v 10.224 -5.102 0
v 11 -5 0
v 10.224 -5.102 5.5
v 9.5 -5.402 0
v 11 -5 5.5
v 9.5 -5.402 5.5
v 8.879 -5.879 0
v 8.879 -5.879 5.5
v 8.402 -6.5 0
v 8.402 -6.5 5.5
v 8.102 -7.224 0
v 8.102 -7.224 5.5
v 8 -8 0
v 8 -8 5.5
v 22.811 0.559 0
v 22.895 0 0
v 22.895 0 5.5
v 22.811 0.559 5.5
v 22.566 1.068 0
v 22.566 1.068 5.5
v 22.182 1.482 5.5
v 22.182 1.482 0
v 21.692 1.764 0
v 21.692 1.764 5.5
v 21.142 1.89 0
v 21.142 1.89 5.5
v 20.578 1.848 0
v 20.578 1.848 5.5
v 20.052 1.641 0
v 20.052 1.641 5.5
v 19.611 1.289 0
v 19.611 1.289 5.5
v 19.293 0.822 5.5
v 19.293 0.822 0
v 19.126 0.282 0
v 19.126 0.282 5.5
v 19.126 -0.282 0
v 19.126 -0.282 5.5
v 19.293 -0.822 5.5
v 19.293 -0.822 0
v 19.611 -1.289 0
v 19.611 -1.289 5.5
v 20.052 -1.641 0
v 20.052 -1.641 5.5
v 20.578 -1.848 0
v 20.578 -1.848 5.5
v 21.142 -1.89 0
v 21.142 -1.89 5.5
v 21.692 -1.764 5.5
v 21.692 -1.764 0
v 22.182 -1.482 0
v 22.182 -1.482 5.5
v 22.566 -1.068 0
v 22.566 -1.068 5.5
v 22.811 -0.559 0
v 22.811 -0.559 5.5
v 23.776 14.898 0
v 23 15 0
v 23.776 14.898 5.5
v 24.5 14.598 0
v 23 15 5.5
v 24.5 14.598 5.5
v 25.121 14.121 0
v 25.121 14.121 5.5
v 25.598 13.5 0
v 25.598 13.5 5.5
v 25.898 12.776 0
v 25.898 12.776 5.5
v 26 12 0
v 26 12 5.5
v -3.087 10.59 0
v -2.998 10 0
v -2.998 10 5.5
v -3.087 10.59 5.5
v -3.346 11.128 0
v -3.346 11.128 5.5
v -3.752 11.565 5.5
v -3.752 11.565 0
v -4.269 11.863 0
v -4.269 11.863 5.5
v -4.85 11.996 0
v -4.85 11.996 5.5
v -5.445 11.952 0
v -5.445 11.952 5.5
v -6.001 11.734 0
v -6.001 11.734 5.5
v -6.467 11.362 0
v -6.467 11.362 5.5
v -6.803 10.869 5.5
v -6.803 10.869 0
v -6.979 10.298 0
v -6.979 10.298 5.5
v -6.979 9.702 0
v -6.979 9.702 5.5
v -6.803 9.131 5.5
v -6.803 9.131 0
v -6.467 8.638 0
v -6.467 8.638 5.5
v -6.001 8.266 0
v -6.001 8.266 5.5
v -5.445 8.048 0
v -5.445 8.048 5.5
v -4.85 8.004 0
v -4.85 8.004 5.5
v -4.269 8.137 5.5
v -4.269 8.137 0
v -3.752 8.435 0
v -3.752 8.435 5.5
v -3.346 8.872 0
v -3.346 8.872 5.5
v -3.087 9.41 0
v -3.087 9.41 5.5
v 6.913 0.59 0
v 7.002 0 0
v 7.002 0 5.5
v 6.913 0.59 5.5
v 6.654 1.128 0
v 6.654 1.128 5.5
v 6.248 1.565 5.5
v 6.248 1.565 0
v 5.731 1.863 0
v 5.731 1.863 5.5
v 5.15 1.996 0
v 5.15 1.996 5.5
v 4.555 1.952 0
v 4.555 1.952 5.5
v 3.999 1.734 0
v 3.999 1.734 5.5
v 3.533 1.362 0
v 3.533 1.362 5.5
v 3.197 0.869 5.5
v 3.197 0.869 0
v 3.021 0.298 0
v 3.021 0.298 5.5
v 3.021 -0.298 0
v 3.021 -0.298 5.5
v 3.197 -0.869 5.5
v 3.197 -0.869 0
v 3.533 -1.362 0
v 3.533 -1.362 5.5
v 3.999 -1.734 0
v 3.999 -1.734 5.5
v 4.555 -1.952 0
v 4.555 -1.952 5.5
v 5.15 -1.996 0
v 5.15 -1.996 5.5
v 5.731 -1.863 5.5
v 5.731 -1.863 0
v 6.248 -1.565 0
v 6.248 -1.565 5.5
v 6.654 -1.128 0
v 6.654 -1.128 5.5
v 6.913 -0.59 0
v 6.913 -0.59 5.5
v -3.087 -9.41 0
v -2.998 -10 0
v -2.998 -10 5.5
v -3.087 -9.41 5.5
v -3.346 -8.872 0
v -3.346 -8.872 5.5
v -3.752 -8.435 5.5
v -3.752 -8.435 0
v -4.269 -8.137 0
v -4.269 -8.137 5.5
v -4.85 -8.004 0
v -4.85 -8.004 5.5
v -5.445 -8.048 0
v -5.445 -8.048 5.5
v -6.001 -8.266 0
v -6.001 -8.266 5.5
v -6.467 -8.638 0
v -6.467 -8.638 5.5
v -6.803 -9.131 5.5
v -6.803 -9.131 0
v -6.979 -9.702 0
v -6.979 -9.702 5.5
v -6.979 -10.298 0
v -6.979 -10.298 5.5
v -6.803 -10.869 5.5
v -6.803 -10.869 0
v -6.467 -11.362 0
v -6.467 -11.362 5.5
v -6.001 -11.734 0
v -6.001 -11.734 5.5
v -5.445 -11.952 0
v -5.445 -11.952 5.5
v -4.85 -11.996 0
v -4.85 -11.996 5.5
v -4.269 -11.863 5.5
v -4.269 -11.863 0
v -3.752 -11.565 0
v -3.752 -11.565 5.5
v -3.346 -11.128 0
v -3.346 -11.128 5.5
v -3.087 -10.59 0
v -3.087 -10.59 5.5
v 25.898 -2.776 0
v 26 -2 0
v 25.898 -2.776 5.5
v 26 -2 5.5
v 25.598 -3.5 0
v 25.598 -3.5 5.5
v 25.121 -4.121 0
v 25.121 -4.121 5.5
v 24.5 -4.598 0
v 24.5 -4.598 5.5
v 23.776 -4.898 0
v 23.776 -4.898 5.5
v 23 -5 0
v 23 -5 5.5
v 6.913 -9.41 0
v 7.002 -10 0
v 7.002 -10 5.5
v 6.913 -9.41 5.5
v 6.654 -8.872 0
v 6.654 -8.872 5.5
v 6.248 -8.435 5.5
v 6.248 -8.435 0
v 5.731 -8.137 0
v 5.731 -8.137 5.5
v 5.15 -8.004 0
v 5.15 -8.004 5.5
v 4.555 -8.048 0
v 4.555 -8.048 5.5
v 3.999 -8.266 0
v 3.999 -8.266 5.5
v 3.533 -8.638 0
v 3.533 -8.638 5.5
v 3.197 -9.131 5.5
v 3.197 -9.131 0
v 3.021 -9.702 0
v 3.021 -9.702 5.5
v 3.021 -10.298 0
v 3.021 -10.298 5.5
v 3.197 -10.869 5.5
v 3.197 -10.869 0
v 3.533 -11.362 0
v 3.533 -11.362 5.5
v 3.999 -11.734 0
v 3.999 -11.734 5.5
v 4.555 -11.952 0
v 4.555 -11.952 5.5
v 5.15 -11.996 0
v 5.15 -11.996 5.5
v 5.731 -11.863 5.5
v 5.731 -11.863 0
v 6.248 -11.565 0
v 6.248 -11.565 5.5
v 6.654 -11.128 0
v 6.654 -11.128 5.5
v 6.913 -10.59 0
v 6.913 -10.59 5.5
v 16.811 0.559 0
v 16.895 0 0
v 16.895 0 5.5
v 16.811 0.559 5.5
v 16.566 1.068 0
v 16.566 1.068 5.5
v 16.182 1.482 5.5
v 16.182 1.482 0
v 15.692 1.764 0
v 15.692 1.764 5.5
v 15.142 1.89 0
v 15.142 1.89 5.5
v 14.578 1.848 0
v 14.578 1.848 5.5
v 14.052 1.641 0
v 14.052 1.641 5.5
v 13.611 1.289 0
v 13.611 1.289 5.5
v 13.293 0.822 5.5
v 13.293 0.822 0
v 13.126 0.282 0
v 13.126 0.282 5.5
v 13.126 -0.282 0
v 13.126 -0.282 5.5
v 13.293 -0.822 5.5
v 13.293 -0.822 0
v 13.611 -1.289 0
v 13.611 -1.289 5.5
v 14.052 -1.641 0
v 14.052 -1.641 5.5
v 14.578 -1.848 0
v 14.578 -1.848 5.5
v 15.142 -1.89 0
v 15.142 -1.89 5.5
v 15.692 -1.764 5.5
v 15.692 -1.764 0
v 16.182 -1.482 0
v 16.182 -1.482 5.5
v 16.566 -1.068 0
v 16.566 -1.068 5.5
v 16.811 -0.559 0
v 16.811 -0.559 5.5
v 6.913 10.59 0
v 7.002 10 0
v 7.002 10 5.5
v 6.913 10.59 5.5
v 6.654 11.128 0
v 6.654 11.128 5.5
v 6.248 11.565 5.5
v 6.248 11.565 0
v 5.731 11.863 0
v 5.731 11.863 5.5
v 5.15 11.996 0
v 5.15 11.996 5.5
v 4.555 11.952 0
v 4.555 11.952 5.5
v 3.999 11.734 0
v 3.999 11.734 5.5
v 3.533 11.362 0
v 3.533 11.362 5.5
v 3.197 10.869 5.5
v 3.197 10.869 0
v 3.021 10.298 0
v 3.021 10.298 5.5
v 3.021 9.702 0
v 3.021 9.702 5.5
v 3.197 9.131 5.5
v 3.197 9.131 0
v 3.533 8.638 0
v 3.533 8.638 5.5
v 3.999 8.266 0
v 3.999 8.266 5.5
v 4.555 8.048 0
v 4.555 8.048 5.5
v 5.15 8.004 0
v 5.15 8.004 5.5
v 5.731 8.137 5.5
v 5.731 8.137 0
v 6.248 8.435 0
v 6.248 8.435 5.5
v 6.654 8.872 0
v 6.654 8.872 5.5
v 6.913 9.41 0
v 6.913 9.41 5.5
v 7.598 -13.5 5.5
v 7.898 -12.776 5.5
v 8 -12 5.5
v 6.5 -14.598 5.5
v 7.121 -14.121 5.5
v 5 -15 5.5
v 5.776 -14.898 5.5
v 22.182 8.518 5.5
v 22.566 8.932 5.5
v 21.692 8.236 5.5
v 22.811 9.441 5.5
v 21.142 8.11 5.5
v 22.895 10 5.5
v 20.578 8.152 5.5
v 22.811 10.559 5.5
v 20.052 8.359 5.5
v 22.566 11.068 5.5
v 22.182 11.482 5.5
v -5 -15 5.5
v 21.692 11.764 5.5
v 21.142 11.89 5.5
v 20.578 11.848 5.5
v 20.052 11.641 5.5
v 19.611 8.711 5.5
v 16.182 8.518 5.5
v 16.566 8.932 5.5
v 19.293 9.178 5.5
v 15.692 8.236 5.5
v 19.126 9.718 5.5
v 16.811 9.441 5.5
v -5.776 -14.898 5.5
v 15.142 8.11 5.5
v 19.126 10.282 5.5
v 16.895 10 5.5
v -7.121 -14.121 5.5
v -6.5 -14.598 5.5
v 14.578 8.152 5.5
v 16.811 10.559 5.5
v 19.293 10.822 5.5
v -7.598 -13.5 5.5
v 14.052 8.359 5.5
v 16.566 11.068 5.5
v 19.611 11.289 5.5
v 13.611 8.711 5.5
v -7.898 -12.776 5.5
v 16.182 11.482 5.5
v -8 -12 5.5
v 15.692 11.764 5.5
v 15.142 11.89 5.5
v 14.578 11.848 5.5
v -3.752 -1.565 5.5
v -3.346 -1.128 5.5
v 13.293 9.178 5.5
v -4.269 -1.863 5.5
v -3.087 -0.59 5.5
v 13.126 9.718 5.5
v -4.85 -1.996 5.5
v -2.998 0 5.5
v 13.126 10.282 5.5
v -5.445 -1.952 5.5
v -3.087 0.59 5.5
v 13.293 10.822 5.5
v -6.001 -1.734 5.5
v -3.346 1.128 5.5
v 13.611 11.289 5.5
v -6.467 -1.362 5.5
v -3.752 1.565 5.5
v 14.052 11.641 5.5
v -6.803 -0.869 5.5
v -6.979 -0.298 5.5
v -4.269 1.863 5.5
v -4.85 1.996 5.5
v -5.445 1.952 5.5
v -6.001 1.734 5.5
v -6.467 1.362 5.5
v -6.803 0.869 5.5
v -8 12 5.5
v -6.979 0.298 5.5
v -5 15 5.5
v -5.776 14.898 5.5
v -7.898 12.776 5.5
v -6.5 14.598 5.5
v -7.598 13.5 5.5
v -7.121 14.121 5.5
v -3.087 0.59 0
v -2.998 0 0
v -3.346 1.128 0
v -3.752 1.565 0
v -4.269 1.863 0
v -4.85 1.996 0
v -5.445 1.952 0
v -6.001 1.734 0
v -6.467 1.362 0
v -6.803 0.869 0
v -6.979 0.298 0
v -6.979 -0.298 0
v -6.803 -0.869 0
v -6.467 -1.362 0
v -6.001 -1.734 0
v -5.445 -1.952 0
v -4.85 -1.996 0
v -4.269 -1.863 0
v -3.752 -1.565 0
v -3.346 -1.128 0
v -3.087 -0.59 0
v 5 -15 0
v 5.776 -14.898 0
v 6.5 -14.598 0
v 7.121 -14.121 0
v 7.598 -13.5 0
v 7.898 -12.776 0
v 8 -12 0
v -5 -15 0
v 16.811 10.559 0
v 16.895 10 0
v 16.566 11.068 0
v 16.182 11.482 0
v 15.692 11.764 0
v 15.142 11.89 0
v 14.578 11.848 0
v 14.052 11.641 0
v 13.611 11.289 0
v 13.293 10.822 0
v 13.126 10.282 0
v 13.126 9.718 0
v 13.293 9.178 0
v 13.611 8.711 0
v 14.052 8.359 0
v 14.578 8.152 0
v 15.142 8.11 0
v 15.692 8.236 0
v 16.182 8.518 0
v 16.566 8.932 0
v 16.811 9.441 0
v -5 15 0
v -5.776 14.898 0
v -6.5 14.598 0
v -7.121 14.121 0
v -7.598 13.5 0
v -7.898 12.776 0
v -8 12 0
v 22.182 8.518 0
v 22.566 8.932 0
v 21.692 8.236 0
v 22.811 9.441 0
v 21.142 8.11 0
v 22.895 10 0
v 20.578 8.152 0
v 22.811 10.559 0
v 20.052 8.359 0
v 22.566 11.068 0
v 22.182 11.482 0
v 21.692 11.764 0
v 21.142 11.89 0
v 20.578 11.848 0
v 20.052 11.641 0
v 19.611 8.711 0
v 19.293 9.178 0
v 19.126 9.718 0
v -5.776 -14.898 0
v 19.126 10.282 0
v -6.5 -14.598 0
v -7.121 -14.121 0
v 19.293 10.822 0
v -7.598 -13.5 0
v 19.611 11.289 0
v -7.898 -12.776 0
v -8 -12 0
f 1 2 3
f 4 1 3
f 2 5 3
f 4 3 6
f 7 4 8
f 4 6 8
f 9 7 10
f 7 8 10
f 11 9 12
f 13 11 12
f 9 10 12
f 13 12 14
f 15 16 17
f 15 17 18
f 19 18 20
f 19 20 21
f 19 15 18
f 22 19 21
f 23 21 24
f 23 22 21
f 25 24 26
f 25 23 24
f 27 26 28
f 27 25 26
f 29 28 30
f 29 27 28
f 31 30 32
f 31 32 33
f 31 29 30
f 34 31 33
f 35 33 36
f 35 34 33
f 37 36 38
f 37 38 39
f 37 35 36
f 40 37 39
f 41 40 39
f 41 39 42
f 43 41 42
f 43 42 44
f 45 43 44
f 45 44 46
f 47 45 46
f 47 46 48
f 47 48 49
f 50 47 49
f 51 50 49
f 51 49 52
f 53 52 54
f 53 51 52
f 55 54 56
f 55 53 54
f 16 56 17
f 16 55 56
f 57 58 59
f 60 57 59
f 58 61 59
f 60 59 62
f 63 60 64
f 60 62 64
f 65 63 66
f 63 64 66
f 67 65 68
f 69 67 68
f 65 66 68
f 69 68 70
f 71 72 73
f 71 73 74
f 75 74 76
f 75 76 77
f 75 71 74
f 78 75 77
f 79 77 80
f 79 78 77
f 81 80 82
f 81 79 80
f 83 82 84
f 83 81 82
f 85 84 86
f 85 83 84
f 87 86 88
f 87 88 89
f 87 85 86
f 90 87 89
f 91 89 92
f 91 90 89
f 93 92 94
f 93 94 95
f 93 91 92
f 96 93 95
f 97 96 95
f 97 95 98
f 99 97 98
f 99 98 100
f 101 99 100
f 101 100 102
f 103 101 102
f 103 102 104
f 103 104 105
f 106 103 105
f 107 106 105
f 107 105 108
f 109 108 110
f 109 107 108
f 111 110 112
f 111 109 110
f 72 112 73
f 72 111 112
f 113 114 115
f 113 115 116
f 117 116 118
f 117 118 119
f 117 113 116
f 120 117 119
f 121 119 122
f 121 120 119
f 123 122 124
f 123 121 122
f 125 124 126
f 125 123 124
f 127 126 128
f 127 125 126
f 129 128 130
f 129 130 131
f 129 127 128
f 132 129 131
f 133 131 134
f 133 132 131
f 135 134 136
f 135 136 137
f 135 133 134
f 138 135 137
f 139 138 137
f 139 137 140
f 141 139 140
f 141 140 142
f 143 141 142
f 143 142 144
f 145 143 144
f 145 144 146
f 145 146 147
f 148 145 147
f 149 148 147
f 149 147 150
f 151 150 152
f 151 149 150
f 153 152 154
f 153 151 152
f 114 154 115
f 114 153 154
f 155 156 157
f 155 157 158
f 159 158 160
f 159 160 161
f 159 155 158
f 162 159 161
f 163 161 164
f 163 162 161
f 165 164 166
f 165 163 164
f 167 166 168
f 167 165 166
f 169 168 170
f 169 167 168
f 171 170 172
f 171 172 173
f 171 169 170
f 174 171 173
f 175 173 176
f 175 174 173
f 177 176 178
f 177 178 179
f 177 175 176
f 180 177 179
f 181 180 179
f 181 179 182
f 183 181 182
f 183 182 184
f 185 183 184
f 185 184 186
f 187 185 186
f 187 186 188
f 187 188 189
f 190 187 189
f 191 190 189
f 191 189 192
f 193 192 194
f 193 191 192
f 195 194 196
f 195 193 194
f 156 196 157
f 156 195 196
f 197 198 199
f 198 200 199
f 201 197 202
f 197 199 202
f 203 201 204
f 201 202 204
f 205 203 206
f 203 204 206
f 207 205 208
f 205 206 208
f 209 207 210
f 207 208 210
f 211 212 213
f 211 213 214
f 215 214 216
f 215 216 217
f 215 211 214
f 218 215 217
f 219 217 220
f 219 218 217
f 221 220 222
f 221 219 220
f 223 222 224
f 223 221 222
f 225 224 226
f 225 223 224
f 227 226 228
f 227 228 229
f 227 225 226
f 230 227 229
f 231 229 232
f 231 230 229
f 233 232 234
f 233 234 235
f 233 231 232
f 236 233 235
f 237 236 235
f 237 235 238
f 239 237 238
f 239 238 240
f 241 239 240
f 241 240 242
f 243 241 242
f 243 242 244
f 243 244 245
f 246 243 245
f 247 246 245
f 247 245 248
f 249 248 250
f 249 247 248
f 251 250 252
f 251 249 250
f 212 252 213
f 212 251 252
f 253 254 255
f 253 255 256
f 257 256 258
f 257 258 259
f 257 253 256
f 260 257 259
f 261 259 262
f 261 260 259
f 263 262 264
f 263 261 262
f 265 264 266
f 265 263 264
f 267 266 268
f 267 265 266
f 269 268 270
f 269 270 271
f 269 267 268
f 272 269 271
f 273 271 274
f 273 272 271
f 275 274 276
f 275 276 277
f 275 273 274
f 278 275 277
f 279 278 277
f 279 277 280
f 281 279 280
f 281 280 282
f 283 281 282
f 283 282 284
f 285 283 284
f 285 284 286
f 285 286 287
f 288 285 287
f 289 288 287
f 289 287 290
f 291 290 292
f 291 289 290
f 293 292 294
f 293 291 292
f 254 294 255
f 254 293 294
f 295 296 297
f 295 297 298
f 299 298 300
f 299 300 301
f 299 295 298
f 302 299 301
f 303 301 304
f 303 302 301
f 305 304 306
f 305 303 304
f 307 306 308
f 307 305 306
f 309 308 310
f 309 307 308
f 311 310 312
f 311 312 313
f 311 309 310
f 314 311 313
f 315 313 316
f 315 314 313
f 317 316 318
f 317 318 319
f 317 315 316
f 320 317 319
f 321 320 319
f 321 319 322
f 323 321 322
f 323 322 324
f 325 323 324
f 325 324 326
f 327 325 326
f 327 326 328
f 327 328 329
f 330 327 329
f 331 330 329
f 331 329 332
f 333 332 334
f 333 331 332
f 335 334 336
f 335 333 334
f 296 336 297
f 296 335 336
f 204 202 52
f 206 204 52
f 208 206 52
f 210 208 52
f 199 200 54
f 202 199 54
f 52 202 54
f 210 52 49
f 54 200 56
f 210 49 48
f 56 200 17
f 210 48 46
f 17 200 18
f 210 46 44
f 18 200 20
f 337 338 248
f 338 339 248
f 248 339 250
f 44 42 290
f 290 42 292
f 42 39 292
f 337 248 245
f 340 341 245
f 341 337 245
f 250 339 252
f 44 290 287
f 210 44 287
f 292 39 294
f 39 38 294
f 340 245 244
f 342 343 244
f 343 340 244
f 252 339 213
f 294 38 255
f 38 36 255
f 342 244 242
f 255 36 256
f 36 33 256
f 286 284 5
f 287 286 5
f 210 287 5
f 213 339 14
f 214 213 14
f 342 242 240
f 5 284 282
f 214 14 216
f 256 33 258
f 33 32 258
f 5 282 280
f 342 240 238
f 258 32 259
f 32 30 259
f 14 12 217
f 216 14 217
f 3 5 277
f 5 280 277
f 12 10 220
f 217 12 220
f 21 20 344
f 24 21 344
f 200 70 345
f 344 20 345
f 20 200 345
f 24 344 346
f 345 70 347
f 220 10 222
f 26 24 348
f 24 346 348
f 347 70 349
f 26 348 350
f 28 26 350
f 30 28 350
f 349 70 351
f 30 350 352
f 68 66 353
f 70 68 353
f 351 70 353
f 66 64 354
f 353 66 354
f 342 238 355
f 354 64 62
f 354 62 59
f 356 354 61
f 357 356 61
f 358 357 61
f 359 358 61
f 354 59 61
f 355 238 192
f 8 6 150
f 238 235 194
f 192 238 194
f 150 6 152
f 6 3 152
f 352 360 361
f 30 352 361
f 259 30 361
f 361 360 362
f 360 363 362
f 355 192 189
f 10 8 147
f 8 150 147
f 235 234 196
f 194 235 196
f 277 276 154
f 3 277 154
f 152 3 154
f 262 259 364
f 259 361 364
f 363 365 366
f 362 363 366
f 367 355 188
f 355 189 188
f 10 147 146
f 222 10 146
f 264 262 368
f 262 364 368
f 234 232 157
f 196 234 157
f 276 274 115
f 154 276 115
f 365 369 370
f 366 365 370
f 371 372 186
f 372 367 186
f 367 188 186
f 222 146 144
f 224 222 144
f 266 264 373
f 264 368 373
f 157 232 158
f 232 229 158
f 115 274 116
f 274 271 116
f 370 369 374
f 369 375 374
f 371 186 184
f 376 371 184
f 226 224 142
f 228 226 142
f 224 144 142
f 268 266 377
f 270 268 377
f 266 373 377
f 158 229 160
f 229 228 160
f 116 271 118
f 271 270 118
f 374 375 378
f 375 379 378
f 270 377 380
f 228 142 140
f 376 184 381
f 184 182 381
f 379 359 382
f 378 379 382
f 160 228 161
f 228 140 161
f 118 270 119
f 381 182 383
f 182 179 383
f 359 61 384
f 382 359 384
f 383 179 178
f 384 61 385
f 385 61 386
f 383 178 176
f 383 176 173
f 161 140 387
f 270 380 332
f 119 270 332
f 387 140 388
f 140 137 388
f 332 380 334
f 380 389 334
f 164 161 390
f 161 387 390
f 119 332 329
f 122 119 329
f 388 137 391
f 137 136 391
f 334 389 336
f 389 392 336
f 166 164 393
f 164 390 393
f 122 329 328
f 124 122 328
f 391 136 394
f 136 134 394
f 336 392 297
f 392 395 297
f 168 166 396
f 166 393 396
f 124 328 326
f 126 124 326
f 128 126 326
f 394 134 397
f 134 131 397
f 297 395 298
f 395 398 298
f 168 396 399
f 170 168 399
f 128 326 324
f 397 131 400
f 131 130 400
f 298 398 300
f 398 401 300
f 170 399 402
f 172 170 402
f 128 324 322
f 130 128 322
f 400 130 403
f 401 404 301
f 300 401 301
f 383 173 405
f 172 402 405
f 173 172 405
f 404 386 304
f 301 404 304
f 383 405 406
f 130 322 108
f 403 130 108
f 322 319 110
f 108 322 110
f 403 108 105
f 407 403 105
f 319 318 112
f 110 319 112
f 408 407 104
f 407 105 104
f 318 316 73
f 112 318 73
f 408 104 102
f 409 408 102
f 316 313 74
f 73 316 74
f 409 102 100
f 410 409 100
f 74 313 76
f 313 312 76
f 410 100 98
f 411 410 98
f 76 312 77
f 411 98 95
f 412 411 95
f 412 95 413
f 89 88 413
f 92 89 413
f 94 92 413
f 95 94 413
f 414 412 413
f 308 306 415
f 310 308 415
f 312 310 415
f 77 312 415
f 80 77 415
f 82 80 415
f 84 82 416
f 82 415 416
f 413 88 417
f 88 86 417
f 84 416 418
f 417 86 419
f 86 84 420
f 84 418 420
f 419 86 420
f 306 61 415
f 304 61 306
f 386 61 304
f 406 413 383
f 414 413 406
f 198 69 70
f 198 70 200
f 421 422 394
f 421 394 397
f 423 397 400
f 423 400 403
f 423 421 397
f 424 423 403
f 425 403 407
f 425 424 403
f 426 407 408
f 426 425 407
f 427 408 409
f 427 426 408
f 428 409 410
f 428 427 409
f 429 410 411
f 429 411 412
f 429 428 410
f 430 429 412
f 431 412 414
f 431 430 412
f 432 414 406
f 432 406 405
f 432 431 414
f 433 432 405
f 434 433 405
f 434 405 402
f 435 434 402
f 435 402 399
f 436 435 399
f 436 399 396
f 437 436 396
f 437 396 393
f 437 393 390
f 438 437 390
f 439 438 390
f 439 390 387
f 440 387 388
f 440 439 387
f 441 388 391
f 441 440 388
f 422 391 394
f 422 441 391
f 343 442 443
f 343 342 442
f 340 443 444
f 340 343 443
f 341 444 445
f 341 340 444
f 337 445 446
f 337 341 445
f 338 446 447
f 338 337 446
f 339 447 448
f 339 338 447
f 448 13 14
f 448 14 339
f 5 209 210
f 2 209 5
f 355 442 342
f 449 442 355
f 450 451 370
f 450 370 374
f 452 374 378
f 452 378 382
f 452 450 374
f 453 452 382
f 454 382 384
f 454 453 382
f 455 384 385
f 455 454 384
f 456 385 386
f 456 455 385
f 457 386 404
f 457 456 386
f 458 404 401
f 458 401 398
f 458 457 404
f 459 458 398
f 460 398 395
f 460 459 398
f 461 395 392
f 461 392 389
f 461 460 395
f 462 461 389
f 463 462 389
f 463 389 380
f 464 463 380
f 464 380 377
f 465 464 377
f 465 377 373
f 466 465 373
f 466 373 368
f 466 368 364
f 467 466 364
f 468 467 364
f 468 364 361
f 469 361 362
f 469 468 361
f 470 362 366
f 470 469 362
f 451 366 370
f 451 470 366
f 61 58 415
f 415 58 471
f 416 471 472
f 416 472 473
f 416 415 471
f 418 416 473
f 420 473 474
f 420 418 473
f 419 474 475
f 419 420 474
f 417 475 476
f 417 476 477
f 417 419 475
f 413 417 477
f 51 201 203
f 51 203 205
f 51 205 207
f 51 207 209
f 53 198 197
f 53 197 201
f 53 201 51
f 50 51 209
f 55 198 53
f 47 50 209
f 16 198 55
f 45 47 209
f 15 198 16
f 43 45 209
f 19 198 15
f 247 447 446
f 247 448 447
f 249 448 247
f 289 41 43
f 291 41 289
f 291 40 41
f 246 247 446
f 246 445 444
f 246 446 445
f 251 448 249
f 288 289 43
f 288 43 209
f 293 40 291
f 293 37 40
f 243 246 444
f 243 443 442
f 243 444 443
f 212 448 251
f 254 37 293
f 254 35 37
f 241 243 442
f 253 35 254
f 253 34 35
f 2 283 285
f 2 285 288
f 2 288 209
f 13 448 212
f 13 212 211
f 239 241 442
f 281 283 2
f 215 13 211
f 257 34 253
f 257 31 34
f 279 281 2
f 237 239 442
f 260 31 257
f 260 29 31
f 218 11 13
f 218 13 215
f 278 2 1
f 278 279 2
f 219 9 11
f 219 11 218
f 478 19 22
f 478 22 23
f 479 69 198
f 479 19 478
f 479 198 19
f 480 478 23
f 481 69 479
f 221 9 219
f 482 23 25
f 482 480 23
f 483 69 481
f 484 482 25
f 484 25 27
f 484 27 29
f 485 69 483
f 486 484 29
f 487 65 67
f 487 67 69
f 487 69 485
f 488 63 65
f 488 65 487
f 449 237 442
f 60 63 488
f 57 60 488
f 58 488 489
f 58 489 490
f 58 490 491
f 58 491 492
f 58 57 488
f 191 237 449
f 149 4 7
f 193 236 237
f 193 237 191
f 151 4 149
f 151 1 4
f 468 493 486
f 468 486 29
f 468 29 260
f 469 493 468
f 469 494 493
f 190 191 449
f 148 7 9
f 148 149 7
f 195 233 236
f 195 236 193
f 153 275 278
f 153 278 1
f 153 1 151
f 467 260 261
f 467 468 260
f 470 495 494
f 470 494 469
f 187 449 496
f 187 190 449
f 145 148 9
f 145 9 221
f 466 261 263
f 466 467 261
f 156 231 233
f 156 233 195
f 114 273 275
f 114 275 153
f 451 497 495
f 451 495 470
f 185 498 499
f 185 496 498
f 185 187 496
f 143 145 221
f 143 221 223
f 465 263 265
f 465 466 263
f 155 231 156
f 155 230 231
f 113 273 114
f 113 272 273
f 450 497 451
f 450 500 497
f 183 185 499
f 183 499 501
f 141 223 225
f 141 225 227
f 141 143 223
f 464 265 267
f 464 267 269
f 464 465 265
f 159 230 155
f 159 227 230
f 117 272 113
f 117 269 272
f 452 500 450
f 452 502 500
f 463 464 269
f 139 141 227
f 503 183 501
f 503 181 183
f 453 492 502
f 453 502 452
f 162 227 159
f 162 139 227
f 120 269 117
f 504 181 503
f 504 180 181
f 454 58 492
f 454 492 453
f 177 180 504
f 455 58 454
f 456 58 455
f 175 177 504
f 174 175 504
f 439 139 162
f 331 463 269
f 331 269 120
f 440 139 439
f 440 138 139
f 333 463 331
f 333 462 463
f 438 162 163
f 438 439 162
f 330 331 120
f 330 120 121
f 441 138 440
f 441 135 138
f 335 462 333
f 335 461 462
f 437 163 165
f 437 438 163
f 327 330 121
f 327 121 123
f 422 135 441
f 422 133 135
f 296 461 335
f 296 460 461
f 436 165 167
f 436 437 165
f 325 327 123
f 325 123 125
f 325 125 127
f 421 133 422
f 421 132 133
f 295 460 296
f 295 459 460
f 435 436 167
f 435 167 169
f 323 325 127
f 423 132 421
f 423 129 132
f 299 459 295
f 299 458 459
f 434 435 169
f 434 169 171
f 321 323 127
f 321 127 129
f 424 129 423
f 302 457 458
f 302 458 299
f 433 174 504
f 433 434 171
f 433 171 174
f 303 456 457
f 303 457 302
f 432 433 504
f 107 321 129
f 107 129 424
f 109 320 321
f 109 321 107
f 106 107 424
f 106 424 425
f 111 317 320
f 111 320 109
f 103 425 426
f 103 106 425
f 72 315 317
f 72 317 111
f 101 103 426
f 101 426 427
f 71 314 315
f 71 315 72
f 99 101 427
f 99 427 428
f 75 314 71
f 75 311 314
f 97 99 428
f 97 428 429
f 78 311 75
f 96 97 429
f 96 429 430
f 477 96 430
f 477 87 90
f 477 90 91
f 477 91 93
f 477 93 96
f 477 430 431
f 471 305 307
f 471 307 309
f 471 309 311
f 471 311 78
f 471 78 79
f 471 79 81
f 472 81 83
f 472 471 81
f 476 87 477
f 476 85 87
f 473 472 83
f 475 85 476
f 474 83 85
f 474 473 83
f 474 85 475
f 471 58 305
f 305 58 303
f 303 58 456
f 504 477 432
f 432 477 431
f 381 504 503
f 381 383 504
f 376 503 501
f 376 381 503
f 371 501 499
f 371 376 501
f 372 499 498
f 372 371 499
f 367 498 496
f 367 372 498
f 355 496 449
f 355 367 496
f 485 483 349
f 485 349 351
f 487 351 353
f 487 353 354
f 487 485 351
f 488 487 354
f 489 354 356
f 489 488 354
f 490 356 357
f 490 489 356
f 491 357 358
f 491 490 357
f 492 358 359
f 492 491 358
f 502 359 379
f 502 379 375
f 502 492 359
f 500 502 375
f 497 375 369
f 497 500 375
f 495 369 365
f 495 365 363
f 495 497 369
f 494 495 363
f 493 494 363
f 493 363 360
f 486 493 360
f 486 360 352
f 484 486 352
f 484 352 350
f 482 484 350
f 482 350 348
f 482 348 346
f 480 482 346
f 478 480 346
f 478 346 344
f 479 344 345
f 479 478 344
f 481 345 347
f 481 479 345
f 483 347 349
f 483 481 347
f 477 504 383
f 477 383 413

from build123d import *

# Parameters (mm, degrees)
SKETCH_1_R      = 2.001727574
SKETCH_1_R_2    = 1.895105282
EXTRUDE_1_DEPTH = 5.5
FILLET_1_R      = 3


with BuildPart() as part:
    # 草图1 → 凸台-拉伸1 (new body)
    with BuildSketch(Plane.XY):
        Polygon((-8, 15), (8, 15), (26, 15), (26, -5), (8, -5), (8, -15), (-8, -15), align=None)
        with Locations((-5, 10)):
            Circle(SKETCH_1_R, mode=Mode.SUBTRACT)
        with Locations((5, 10)):
            Circle(SKETCH_1_R, mode=Mode.SUBTRACT)
        with Locations((5, 0)):
            Circle(SKETCH_1_R, mode=Mode.SUBTRACT)
        with Locations((5, -10)):
            Circle(SKETCH_1_R, mode=Mode.SUBTRACT)
        with Locations((-5, 0)):
            Circle(SKETCH_1_R, mode=Mode.SUBTRACT)
        with Locations((-5, -10)):
            Circle(SKETCH_1_R, mode=Mode.SUBTRACT)
        with Locations((15, 10)):
            Circle(SKETCH_1_R_2, mode=Mode.SUBTRACT)
        with Locations((21, 10)):
            Circle(SKETCH_1_R_2, mode=Mode.SUBTRACT)
        with Locations((21, 0)):
            Circle(SKETCH_1_R_2, mode=Mode.SUBTRACT)
        with Locations((15, 0)):
            Circle(SKETCH_1_R_2, mode=Mode.SUBTRACT)
    extrude(amount=EXTRUDE_1_DEPTH)

    # 圆角1
    fillet_1_edges = [part.edges().sort_by_distance(p)[0] for p in [
        (8, -15, 2.75),
        (-8, -15, 2.75),
        (-8, 15, 2.75),
        (26, 15, 2.75),
        (26, -5, 2.75),
        (8, -5, 2.75),
    ]]
    fillet(fillet_1_edges, radius=FILLET_1_R)


solid = part.part
